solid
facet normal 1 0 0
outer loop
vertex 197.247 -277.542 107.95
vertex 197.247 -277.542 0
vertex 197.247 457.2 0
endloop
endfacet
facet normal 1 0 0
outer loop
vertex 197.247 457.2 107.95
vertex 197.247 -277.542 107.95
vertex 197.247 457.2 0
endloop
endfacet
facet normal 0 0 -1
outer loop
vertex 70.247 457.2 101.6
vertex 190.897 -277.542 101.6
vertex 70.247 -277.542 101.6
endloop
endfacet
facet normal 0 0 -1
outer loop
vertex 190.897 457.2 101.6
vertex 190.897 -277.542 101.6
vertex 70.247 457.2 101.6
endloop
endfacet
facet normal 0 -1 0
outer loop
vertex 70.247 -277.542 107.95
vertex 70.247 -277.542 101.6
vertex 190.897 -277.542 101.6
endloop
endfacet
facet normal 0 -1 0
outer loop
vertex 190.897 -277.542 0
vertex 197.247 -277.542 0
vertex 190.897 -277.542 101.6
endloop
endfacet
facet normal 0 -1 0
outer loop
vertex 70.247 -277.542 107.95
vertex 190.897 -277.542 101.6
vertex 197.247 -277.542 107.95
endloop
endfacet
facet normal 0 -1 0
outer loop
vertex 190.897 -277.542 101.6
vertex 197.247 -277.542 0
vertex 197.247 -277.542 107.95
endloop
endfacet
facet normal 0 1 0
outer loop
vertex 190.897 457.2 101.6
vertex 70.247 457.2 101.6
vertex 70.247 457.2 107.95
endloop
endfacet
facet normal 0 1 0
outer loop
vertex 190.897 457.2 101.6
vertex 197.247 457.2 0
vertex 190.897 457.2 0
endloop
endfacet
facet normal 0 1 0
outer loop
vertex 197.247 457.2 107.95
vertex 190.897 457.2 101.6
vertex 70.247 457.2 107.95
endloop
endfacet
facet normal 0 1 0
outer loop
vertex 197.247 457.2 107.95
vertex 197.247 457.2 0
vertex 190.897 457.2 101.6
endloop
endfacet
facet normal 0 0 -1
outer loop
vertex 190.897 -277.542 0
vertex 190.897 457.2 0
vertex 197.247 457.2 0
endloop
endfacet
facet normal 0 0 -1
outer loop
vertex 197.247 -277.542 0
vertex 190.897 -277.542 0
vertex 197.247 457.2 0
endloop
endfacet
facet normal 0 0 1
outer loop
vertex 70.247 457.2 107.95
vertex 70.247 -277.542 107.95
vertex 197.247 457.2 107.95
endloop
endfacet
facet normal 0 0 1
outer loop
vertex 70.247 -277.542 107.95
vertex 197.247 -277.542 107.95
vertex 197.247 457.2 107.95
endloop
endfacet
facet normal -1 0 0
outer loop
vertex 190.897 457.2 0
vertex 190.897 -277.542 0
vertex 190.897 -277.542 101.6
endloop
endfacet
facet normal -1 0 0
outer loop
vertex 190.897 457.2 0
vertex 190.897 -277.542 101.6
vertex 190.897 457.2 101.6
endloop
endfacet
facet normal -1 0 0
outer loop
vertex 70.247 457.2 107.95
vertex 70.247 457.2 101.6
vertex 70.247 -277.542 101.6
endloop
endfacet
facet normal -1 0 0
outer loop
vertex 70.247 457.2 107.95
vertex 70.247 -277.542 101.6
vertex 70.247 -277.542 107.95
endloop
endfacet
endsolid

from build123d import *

# Parameters (mm, degrees)
SKETCH1_W           = 6.35
SKETCH1_H           = 734.741844671
BOSS_EXTRUDE1_DEPTH = 107.95
SKETCH2_W           = 6.35
SKETCH2_H           = 734.741844671
BOSS_EXTRUDE2_DEPTH = 120.65


with BuildPart() as part:
    # Sketch1 → Boss-Extrude1 (new body)
    with BuildSketch(Plane.XY):
        with Locations((194.071875, 89.829077665)):
            Rectangle(SKETCH1_W, SKETCH1_H)
    extrude(amount=BOSS_EXTRUDE1_DEPTH)

    # Sketch2 → Boss-Extrude2 (add)
    with BuildSketch(Plane.ZY.offset(-190.896875)):
        with Locations((104.775, 89.829077665)):
            Rectangle(SKETCH2_W, SKETCH2_H)
    extrude(amount=BOSS_EXTRUDE2_DEPTH)


solid = part.part
